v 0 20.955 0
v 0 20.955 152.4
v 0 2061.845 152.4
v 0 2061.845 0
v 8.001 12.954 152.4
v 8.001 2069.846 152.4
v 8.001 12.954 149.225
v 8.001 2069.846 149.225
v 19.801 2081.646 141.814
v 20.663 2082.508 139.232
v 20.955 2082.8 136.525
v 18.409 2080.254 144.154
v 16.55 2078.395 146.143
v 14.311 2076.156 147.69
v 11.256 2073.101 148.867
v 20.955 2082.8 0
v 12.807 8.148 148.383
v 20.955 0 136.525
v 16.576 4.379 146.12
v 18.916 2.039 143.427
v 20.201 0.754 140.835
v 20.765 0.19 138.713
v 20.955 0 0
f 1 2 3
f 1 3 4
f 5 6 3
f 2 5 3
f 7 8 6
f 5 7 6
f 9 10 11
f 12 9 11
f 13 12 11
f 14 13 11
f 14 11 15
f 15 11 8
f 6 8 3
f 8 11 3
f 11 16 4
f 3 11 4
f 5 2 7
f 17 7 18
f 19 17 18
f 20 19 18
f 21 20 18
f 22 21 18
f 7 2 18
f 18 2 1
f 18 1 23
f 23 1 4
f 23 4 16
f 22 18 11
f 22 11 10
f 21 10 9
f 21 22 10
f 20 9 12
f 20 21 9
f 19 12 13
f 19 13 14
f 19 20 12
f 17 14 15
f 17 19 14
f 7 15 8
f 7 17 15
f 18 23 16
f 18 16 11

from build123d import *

# Parameters (mm, degrees)
F1_DEPTH = 2082.8
F3_DEPTH = 152.4
F5_DEPTH = 152.4


with BuildPart() as f1:
    # F0 (on Front) → F1 (new body)
    with BuildSketch(Plane.XZ):
        with BuildLine():
            Line((0, 152.4), (0, 0))
            Line((0, 0), (20.955, 0))
            Line((20.955, 0), (20.955, 136.525))
            ThreePointArc((20.955, 136.525), (17.14516, 145.595503), (8.001, 149.225))
            Line((8.001, 149.225), (8.001, 152.4))
            Line((8.001, 152.4), (0, 152.4))
        make_face()
    extrude(amount=-F1_DEPTH)

    # F2 (on face) → F3 (cut)
    with BuildSketch(Plane(origin=(0, 0, 0), x_dir=(1, 0, 0), z_dir=(0, 0, -1))):
        Polygon((0, -20.955), (20.955, 0), (0, 0), align=None)
    extrude(amount=-F3_DEPTH, mode=Mode.SUBTRACT)

    # F4 (on face) → F5 (cut)
    with BuildSketch(Plane(origin=(0, 0, 0), x_dir=(1, 0, 0), z_dir=(0, 0, -1))):
        Polygon((0, -2082.8), (20.955, -2082.8), (0, -2061.845), align=None)
    extrude(amount=-F5_DEPTH, mode=Mode.SUBTRACT)


solid = f1.part
